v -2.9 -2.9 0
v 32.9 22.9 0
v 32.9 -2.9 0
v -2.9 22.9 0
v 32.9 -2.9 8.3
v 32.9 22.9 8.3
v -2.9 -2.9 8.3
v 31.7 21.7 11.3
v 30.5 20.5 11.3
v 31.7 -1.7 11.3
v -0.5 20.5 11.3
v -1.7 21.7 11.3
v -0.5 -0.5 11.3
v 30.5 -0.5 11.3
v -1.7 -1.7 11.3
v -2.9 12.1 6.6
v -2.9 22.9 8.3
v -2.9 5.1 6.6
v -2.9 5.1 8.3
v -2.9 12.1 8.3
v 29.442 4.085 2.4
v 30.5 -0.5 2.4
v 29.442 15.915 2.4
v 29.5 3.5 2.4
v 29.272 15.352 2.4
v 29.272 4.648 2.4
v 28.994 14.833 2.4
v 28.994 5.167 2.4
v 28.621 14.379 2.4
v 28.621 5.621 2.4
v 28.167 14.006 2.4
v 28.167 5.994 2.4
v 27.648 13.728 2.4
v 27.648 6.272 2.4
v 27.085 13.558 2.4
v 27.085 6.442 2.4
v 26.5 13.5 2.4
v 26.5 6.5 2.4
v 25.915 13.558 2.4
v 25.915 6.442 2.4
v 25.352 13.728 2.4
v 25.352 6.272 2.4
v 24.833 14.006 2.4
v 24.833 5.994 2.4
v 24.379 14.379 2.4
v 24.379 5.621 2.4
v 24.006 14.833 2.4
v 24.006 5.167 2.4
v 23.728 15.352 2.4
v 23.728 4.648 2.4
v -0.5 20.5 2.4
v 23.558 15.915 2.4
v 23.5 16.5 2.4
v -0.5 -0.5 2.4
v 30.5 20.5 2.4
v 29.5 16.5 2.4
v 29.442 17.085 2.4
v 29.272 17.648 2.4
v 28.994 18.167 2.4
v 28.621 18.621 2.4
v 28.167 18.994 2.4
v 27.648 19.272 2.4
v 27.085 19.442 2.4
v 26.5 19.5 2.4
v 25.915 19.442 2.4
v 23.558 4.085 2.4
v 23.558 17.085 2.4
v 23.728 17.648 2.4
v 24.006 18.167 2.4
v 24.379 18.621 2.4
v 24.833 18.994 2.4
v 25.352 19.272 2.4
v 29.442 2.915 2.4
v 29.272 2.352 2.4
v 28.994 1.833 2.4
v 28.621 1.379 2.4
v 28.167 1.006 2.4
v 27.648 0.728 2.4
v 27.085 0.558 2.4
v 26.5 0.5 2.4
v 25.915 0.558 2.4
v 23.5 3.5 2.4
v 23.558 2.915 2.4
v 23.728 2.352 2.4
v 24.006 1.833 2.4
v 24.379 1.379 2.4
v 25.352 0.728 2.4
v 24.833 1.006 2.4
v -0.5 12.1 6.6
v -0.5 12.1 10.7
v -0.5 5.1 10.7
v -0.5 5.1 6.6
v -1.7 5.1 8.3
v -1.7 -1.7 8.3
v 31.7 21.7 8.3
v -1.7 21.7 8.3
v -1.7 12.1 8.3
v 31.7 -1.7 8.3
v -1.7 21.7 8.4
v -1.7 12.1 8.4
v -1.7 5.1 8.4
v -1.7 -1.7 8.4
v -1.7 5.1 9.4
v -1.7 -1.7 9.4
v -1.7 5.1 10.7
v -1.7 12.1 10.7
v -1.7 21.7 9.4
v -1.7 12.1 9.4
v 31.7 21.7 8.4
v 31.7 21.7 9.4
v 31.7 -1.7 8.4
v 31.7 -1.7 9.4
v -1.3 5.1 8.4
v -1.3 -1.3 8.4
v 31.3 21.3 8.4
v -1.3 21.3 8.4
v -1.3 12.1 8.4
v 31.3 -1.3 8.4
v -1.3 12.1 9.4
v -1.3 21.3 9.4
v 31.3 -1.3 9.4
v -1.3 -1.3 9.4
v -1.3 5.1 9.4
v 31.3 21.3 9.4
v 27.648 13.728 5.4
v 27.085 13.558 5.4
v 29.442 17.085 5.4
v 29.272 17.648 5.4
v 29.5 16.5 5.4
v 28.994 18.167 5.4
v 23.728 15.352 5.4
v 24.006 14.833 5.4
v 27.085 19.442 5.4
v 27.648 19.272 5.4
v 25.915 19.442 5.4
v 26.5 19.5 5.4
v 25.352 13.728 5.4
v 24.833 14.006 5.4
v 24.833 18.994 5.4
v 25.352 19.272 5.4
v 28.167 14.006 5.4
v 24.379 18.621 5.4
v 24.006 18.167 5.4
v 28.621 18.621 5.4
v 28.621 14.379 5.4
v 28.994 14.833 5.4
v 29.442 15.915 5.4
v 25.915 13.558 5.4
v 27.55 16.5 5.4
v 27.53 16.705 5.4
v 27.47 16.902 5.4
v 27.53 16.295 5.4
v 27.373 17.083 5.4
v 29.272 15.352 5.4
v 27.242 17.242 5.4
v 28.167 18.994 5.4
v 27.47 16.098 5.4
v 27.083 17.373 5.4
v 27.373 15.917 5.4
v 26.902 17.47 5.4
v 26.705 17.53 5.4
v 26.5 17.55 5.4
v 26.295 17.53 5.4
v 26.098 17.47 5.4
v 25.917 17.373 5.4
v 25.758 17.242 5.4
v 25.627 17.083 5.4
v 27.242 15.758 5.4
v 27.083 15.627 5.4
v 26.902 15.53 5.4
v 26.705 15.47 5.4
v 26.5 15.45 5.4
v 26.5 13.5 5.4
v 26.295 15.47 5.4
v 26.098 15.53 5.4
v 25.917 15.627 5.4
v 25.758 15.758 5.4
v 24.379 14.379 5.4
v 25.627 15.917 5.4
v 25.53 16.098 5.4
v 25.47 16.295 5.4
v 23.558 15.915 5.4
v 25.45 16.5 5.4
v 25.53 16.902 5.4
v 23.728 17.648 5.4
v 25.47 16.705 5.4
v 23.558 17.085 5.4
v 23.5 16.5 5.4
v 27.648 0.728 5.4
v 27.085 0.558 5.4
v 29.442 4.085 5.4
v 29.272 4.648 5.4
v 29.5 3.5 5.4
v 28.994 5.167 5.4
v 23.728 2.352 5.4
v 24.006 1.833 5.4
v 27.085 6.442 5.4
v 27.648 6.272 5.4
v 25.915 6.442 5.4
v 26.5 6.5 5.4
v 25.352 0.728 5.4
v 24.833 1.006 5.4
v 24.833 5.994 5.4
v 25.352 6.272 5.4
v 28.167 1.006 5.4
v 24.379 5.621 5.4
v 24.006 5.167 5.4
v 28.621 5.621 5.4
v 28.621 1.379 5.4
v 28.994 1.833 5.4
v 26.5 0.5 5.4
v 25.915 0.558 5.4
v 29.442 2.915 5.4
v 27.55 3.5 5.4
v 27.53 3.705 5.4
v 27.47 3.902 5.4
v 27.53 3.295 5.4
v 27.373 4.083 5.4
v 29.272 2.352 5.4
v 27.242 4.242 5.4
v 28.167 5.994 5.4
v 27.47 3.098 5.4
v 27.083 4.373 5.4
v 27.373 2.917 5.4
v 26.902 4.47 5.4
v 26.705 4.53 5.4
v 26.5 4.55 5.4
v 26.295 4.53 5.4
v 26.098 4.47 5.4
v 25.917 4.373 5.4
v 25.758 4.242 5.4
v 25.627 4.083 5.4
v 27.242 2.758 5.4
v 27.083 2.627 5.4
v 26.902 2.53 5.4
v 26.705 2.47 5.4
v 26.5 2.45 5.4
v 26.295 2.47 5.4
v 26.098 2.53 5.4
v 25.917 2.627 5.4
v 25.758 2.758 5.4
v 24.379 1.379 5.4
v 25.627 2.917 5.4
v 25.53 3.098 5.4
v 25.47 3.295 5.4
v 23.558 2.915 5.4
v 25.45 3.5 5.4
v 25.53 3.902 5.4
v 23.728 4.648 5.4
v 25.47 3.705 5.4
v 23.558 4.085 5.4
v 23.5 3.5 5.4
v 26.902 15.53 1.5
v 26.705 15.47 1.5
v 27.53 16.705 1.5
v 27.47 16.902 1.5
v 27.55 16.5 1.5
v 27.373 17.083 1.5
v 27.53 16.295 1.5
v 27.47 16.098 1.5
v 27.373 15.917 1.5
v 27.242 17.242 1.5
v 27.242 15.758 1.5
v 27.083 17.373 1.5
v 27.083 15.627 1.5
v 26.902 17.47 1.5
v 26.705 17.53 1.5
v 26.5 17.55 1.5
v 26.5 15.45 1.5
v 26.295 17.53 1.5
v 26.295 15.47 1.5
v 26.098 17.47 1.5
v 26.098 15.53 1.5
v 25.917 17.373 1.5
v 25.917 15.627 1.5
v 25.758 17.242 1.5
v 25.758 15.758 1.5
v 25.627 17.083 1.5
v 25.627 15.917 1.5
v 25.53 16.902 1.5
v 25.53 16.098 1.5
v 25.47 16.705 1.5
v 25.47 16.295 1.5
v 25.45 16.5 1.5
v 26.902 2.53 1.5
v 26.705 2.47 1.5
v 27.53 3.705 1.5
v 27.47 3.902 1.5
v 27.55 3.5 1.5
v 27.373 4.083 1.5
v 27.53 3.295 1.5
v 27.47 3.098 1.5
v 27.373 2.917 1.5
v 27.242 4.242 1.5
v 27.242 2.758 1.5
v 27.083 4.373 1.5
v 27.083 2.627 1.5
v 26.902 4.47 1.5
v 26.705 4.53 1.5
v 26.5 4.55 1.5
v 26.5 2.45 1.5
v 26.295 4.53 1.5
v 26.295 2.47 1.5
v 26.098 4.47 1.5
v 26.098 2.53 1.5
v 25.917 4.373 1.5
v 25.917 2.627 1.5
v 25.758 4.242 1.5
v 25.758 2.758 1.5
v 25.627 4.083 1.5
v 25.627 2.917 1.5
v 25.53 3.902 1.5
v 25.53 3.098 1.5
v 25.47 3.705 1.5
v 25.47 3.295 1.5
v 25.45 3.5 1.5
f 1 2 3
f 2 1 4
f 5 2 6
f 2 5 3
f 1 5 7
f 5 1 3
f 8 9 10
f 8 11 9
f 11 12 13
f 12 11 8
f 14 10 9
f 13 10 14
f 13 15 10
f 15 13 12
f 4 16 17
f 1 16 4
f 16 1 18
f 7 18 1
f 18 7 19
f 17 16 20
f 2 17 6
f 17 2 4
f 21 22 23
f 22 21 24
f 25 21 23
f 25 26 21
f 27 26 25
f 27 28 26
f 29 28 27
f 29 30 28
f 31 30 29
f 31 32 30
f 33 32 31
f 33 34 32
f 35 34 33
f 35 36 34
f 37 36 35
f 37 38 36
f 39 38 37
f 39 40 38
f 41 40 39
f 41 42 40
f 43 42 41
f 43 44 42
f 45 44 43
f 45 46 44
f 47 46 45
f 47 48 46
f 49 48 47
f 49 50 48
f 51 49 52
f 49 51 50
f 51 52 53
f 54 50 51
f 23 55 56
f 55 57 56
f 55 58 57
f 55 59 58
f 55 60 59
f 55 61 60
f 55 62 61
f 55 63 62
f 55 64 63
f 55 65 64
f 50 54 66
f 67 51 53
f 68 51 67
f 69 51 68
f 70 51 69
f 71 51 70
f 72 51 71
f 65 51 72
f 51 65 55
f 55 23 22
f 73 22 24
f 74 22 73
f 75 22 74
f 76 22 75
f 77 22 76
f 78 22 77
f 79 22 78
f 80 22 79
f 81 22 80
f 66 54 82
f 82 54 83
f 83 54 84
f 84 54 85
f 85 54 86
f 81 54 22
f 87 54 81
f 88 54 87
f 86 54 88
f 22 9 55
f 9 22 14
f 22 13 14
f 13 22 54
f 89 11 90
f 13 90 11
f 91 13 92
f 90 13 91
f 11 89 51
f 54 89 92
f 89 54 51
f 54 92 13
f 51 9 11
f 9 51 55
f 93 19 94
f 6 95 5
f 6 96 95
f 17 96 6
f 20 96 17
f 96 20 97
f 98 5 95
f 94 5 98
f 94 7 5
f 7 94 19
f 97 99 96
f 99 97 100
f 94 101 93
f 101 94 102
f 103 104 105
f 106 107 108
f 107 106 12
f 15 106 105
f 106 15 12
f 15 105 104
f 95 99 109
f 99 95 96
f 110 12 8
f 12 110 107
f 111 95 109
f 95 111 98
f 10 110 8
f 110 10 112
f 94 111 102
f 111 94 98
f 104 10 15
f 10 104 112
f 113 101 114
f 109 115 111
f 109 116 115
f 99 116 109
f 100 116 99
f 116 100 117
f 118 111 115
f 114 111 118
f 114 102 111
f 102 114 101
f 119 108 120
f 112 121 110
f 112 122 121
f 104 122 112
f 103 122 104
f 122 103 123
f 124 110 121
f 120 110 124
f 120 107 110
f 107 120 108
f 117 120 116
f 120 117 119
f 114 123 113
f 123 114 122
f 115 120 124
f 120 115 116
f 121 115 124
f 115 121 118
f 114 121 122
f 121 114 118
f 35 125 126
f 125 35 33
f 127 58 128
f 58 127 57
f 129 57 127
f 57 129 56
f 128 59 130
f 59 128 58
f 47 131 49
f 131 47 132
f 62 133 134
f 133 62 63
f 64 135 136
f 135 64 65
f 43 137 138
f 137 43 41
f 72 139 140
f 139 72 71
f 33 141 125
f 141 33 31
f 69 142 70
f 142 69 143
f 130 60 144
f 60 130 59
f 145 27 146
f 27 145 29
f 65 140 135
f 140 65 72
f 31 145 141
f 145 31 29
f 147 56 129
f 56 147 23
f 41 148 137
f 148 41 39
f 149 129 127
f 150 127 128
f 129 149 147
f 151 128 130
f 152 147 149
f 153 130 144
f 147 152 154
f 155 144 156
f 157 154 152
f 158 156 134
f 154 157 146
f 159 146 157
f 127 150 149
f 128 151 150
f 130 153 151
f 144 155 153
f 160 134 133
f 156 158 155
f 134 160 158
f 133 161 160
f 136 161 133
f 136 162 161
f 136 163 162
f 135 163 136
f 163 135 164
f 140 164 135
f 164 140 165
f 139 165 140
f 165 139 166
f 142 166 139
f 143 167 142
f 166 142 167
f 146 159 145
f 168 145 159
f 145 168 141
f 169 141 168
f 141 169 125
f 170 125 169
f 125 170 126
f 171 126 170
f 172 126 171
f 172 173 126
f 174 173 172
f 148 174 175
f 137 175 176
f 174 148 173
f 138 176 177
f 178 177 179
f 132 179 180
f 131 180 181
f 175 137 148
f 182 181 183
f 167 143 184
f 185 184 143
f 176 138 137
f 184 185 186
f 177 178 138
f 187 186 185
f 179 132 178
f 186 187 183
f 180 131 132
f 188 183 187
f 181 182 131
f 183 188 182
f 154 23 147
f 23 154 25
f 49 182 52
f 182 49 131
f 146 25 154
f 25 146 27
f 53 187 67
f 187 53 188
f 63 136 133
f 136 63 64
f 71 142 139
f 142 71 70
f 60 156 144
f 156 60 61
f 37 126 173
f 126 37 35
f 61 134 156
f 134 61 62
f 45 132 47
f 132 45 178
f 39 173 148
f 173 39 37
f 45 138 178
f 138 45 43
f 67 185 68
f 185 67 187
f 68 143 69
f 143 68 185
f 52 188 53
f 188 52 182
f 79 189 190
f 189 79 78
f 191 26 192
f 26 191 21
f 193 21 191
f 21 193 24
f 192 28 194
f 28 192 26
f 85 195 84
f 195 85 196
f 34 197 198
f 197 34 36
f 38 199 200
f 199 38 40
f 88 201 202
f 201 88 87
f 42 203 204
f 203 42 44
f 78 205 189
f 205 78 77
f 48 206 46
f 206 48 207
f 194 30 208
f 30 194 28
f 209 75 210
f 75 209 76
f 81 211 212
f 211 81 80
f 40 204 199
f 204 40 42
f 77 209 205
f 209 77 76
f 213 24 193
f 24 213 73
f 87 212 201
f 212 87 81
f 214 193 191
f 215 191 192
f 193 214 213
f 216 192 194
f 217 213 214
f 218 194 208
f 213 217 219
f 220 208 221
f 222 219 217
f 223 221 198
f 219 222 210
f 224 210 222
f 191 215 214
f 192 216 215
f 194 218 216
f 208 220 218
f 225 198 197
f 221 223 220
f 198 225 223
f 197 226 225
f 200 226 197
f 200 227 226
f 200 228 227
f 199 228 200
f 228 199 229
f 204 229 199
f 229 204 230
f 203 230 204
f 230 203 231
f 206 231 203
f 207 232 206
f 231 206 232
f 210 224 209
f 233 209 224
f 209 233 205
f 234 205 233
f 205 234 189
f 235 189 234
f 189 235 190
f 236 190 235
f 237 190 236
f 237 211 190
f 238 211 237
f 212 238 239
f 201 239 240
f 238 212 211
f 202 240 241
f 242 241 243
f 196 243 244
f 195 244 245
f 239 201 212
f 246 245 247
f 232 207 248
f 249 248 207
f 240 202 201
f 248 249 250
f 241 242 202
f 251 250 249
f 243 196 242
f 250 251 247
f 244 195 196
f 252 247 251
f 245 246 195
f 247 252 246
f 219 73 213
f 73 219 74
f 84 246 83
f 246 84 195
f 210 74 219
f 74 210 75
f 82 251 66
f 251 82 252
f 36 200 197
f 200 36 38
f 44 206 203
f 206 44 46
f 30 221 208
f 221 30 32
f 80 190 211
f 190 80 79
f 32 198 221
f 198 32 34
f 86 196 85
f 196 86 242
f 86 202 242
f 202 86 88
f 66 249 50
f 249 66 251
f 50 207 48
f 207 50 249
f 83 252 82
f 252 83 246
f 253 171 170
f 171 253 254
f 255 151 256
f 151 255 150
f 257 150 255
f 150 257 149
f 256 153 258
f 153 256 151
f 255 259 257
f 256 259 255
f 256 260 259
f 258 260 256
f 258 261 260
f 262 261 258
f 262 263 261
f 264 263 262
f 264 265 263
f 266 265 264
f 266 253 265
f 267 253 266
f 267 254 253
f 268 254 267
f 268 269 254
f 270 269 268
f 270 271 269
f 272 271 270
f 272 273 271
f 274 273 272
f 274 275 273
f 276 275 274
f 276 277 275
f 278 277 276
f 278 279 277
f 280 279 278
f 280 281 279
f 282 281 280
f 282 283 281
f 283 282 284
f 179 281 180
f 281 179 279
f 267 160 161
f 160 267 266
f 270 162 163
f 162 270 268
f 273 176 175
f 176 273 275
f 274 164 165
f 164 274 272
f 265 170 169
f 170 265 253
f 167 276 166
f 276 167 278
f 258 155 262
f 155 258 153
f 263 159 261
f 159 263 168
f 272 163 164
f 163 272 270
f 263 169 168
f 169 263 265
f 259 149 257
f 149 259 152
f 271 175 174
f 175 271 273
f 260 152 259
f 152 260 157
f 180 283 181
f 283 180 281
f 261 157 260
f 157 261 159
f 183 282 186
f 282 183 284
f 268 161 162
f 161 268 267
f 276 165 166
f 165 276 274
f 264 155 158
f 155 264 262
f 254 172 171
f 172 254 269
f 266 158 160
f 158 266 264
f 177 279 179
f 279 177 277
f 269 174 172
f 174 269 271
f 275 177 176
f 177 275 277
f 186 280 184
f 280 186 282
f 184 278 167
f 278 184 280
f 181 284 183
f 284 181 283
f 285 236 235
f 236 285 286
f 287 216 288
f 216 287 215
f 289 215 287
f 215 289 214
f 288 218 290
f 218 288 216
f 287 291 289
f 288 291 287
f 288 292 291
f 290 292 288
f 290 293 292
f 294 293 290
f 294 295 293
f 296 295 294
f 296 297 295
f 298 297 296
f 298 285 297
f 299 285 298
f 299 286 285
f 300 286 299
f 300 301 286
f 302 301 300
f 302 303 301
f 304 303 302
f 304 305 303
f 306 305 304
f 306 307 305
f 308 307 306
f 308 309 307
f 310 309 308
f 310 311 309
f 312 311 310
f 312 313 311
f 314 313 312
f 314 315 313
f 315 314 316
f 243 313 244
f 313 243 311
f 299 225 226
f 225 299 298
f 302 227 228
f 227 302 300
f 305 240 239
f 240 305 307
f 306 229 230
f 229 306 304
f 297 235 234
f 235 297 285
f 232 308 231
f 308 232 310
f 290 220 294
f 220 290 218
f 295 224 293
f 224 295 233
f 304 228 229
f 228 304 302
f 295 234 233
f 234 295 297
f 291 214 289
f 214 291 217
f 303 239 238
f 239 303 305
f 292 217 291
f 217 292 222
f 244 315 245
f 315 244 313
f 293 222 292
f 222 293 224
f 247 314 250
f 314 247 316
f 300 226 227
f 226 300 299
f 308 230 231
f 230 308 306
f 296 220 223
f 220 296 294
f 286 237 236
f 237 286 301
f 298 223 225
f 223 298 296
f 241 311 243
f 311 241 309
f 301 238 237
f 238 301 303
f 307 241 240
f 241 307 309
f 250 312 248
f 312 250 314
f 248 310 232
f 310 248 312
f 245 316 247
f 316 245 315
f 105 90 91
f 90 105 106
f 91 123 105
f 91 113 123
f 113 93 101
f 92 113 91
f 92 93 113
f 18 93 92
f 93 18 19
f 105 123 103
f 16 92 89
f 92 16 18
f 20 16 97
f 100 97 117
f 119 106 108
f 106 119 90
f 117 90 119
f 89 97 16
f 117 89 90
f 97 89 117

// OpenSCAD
// The base of the housing "usbc_snap", written by enclosure-nv 0.1.0
// from the board file usbc_board.kicad_pcb.  Render with OpenSCAD.
// Parameters, in millimetres.  The same block heads every file of this housing:
// when a value is changed, change it in each file.
wall = 2.4;
floor_t = 2.4;
lid_t = 1.6;
clear = 0.5;  // the board's edge to the inside of the wall
standoff_d = 6;
screw_d = 2.5;
pilot_d = 2.1;
head_d = 5;
head_h = 1.6;
lip_h = 3;  // the height of the step the lid sits on
lid_gap = 0.2;
snap_depth = 0.4;
snap_h = 0.8;
led_d = 3;
button_d = 3;
board_t = 1.6;
standoff_h = 3;  // the space under the board
top_space = 4.3;  // the space above the board
pilot_len = 3.9;  // the depth of the screw's hole
print_flip = false;  // true lays the lid plate down

// Levels along z.
z_bb = floor_t + standoff_h;
z_bt = z_bb + board_t;
z_split = z_bt + top_space;
z_step = z_split - lip_h;
z_top = z_split + lid_t;
z_skirt = z_step + lid_gap;
a_in = wall / 2;
screw_clear = screw_d + 0.3;

module outline() {
  polygon(points = [[0, 0], [30, 0], [30, 20], [0, 20]]);
}

module base() {
  difference() {
    union() {
      difference() {
        linear_extrude(height = z_split) offset(delta = clear + wall) outline();
        translate([0, 0, floor_t]) linear_extrude(height = z_split) offset(delta = clear) outline();
        translate([0, 0, z_step]) linear_extrude(height = z_split) difference() {
          offset(delta = clear + wall + 1) outline();
          offset(delta = clear + a_in) outline();
        }
        // the groove the lid's bead clicks into
        translate([0, 0, z_skirt - 0.1]) linear_extrude(height = snap_h + 0.2) difference() {
          offset(delta = clear + a_in + 0.01) outline();
          offset(delta = clear + a_in - snap_depth) outline();
        }
      }
      // the standoffs
      translate([26.5, 16.5, floor_t / 2]) cylinder(h = z_bb - floor_t / 2, d = standoff_d, $fn = 32);
      translate([26.5, 3.5, floor_t / 2]) cylinder(h = z_bb - floor_t / 2, d = standoff_d, $fn = 32);
    }
    // the screw holes, blind
    translate([26.5, 16.5, z_bb - pilot_len]) cylinder(h = pilot_len + 1, d = pilot_d, $fn = 32);
    translate([26.5, 3.5, z_bb - pilot_len]) cylinder(h = pilot_len + 1, d = pilot_d, $fn = 32);
    // the openings
    translate([0, 8.6, z_bt + (-0.4)]) rotate([0, 0, 180]) translate([-1, -3.5, 0]) cube([clear + wall + 2, 7, 4.1]);
  }
}

base();
